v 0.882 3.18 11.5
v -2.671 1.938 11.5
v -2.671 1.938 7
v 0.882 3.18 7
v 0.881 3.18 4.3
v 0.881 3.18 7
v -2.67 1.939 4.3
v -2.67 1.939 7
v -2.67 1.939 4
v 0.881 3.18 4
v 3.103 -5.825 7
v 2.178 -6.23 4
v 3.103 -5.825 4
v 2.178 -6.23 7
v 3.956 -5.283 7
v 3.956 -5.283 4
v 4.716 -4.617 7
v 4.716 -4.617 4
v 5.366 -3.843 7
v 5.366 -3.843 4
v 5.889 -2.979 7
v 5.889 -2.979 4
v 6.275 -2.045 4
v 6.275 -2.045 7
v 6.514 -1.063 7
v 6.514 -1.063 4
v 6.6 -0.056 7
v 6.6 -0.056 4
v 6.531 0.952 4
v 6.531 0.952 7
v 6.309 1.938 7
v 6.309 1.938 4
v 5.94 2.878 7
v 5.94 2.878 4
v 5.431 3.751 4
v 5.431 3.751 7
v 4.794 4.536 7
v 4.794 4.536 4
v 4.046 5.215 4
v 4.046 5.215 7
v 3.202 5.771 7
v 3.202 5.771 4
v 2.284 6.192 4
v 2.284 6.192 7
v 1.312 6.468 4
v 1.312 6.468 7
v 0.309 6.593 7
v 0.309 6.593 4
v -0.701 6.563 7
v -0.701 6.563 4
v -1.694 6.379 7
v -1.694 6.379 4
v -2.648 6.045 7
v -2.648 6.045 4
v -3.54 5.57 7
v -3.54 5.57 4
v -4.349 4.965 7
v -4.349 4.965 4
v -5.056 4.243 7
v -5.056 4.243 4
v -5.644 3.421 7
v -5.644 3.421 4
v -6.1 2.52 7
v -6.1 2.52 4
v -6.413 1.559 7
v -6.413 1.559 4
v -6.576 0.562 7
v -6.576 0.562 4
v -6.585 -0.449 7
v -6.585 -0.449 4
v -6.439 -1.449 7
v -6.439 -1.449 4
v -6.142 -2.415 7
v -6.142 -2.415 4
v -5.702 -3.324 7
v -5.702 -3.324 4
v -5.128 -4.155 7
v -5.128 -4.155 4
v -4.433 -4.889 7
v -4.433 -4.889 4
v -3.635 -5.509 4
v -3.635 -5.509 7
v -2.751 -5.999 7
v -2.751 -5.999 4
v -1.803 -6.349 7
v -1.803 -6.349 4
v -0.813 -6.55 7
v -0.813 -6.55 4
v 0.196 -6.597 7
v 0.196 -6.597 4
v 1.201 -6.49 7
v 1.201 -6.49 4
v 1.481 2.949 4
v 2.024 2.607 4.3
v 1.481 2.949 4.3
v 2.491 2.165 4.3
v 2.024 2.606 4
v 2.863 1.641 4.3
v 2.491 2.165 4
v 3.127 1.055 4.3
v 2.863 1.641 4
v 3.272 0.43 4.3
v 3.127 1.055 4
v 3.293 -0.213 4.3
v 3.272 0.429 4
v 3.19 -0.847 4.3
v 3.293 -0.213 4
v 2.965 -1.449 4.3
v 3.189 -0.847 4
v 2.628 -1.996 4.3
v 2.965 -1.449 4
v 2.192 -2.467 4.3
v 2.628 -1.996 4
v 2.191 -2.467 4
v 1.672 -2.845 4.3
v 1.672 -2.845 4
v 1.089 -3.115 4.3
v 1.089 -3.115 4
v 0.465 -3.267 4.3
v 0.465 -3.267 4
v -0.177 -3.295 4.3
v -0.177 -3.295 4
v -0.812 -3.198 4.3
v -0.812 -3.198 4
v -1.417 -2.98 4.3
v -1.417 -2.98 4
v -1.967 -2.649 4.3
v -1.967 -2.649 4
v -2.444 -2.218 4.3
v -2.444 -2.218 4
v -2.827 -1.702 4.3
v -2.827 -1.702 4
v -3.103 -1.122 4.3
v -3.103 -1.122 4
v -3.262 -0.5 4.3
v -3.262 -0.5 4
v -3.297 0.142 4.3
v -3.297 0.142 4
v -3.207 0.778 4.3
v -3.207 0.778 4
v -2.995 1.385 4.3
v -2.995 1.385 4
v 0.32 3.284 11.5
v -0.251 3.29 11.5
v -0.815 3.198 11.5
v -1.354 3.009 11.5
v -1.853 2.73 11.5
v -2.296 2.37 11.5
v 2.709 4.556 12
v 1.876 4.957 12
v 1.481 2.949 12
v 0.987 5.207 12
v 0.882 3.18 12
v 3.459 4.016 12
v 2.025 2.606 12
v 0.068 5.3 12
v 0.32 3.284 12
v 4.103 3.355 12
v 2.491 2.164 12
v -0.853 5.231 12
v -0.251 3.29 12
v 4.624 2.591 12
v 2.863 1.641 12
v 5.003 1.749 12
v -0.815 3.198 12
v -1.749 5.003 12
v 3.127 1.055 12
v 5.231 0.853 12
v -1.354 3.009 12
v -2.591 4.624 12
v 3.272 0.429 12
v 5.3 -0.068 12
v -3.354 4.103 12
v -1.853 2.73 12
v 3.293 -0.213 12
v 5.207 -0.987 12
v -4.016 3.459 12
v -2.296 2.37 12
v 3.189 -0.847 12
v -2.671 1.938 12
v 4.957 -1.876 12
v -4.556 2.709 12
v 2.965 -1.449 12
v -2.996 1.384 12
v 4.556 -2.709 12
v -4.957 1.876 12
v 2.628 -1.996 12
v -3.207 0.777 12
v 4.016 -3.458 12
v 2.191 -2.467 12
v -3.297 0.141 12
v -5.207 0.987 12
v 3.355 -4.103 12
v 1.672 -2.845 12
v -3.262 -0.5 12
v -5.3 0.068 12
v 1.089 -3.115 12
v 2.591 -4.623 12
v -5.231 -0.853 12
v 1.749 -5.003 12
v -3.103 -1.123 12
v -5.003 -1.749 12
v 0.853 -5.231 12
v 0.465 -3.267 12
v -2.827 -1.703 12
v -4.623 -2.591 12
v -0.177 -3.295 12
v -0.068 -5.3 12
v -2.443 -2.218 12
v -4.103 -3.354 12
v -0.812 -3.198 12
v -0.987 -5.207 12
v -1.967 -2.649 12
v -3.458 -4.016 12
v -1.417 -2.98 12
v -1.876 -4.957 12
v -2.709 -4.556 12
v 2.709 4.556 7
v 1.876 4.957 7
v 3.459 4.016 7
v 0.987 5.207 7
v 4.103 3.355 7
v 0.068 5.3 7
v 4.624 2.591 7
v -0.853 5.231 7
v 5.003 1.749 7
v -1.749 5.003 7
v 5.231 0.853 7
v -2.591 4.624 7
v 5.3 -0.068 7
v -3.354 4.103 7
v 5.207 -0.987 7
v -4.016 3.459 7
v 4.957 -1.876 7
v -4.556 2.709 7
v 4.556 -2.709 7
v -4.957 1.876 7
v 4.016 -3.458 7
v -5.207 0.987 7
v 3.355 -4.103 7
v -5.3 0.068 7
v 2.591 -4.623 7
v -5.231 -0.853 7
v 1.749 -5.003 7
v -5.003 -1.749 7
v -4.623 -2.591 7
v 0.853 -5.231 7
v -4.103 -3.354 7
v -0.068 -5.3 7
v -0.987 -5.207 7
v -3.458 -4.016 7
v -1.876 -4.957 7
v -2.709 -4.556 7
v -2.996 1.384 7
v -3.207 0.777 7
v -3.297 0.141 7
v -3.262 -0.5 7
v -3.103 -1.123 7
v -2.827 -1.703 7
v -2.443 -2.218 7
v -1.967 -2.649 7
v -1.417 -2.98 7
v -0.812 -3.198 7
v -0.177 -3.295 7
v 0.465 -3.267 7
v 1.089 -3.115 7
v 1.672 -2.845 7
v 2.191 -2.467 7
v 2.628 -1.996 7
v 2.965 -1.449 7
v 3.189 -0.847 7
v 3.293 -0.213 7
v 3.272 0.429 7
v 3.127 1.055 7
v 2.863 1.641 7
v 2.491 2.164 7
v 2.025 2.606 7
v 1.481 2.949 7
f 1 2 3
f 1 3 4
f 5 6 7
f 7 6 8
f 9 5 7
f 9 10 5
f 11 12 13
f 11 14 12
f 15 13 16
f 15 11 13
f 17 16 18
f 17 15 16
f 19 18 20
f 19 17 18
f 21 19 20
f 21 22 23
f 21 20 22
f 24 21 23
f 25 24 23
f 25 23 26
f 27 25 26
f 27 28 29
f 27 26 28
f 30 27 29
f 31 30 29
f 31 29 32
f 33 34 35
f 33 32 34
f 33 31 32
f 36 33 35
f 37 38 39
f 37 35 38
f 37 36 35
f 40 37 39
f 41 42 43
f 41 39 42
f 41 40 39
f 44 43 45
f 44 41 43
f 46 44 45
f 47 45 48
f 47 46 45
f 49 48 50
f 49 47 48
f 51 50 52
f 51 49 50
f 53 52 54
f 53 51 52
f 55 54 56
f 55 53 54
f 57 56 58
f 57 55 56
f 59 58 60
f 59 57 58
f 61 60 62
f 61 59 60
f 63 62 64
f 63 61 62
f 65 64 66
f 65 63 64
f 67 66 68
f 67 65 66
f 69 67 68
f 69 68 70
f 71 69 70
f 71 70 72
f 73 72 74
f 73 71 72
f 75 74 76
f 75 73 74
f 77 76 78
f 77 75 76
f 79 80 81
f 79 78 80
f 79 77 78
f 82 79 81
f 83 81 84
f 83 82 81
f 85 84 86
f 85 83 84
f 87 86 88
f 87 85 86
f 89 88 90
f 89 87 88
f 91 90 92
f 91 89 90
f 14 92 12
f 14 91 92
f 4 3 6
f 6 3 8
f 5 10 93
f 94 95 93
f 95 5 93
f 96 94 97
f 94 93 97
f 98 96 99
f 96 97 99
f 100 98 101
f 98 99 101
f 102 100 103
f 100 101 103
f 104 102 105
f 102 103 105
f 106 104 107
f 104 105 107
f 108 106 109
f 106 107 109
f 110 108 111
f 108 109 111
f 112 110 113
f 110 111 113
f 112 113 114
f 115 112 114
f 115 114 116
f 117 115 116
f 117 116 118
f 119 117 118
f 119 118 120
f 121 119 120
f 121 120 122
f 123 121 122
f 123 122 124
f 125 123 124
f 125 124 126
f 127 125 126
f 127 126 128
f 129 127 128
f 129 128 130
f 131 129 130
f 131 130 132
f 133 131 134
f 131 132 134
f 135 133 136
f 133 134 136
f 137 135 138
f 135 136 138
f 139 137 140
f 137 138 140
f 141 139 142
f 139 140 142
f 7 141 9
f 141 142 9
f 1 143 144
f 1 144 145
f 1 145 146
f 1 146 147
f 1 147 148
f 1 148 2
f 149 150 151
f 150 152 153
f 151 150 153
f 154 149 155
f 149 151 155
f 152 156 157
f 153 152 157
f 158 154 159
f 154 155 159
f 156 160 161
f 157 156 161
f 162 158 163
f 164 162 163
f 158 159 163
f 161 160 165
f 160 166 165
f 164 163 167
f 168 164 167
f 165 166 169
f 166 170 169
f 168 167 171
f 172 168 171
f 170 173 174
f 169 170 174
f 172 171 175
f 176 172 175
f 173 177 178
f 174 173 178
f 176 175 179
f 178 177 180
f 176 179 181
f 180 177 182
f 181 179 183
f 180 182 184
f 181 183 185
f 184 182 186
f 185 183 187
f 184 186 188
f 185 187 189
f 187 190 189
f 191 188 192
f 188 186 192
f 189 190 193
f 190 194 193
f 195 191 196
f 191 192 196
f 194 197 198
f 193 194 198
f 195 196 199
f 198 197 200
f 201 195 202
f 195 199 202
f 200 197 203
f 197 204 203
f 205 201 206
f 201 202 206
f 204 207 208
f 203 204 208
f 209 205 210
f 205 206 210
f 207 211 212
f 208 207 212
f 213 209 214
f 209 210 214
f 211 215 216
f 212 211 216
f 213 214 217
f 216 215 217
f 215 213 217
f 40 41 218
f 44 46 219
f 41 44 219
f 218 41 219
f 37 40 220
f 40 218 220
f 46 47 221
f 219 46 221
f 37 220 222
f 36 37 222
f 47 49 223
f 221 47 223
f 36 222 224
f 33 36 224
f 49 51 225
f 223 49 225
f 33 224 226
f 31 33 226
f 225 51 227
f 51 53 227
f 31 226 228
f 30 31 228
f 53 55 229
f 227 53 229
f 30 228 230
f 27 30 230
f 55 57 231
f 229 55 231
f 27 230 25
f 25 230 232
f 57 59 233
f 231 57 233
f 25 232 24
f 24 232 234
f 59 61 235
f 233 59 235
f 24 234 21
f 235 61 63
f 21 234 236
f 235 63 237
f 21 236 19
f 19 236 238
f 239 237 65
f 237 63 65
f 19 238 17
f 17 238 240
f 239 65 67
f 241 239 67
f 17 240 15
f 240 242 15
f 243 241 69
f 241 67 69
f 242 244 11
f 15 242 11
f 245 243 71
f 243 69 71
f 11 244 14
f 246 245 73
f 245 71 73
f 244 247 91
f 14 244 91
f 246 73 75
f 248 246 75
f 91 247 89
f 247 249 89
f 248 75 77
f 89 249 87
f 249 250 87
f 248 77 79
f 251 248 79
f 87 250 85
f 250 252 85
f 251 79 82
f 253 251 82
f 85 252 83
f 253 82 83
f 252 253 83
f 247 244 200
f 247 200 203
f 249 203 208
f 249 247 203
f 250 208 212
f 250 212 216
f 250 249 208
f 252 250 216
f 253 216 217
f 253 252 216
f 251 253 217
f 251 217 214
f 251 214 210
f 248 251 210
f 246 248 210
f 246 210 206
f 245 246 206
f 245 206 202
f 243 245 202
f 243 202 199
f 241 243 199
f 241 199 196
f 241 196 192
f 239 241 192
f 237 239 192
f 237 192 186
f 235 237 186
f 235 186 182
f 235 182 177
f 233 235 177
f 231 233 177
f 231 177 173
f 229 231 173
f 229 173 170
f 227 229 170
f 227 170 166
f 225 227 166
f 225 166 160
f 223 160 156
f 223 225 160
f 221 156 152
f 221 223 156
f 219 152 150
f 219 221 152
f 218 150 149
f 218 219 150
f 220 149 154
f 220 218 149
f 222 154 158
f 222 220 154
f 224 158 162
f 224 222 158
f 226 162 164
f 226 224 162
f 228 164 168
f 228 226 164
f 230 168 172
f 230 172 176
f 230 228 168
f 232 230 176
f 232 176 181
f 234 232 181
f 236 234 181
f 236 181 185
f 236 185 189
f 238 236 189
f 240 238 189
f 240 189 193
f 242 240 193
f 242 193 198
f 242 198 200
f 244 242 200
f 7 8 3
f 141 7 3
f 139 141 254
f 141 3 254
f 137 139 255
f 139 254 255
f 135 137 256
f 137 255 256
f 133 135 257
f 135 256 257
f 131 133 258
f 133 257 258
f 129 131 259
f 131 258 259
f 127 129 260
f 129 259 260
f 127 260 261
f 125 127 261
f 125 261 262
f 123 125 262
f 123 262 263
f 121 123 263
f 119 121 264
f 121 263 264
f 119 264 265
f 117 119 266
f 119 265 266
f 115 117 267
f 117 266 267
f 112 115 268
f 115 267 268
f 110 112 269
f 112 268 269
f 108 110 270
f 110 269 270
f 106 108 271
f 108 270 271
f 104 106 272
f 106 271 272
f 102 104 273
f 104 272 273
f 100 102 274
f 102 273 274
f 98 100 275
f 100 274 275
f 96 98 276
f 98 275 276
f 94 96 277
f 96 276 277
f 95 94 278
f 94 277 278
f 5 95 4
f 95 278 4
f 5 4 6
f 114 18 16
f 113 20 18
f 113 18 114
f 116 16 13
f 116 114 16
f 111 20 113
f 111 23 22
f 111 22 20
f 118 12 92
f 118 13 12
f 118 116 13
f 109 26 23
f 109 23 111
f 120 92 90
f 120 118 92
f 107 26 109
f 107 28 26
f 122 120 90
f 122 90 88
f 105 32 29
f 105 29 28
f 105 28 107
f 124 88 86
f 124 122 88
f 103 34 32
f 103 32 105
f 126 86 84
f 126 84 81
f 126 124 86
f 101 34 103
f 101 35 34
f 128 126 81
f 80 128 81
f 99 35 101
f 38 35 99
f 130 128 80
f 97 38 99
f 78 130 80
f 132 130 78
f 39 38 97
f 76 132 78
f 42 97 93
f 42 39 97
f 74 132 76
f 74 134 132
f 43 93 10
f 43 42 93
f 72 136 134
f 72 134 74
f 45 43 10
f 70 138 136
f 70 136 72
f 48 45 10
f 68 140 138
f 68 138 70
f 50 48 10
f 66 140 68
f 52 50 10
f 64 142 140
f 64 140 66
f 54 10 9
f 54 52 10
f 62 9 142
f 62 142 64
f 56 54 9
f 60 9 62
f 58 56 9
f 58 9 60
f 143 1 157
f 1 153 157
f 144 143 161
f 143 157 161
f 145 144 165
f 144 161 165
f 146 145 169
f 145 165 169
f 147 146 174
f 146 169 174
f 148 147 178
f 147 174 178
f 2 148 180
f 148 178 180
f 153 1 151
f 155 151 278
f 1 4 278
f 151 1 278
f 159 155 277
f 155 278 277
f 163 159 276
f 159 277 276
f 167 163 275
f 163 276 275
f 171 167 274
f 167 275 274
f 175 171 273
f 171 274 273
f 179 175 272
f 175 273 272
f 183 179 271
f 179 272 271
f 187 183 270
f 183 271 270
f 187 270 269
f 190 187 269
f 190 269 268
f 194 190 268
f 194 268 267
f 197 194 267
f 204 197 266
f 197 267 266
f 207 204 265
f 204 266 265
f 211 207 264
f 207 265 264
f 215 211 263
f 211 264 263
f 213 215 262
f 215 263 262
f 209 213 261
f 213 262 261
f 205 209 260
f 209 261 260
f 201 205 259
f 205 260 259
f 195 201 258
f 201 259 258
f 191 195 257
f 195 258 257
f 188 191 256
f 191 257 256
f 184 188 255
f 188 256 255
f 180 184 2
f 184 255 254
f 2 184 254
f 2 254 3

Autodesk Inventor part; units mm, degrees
ref_plane "YZ Plane" through (0, 0, 0) normal (1, 0, 0) x (0, 1, 0)
ref_plane "XZ Plane" through (0, 0, 0) normal (0, 1, 0) x (-1, 0, 0)
ref_plane "XY Plane" through (0, 0, 0) normal (0, 0, 1) x (1, 0, 0)
ref_plane "Work Plane1" through (-3.2804, 8.4734, 7) normal (0, 0, -1) x (0.3299562, -0.9439962, 0)
sketch "Sketch5" plane through (-3.2804, 8.4734, 7) normal (0, 0, -1) x (0.3299562, -0.9439962, 0)
  circle A0 centre (9.0812, -0.3009) radius 5.6 projected
  circle A1 centre (9.0812, -0.3009) radius 6.6
  point P0 (9.0812, -0.3009)
  dimension "d13" = 1
extrude "Extrusion4" add sketch "Sketch5" along normal blind 3
sketch "Sketch6" plane through (0, 0, 7) normal (0, 0, 1) x (1, 0, 0)
  circle A0 centre (0, 0) radius 6.6 projected
  circle A1 centre (0, 0) radius 5.6 projected
  point P0 (0, 0)
extrude "Extrusion5" cut sketch "Sketch6" against normal blind 0.3
sketch "Sketch11" plane through (-3.2804, 8.4734, 7) normal (0, 0, -1) x (0.3299562, -0.9439962, 0)
  circle A0 centre (9.0812, -0.3009) radius 6.6
  circle A1 centre (9.0812, -0.3009) radius 3.3
  line L0 (6.3698, -2.1819) -> (6.3698, 1.5801)
  dimension "d26" = 13.2
  dimension "d27" = 6.6
  dimension "d28" = 3.762
extrude "Extrusion10" add sketch "Sketch11" along normal blind 2.7 contours A0 | L0 A1 picked at (6.2456, 0.0906)
sketch "Sketch13" plane through (-3.2804, 8.4734, 7) normal (0, 0, -1) x (0.3299562, -0.9439962, 0)
  circle A0 centre (9.0812, -0.3009) radius 5.3
  arc A1 (6.3703, -2.1826) -> (6.3703, 1.5809) centre (9.0812, -0.3009) ccw projected
  line L0 (6.3703, 1.5809) -> (6.3703, -2.1826) projected
  dimension "d33" = 10.6
extrude "Extrusion12" add sketch "Sketch13" against normal blind 5
sketch "Sketch14" plane through (0, 0, 4) normal (0, 0, -1) x (-1, 0, 0)
  line L0 (-0.881, 3.1802) -> (2.6703, 1.9389) projected
  arc A0 (-0.881, 3.1802) -> (2.6703, 1.9389) centre (0, 0) ccw projected
  circle A1 centre (0, 0) radius 5.6 projected
  point P0 (0, 0)
extrude "Extrusion13" add sketch "Sketch14" against normal up to surface (0.3 mm away)
sketch "Sketch15" plane through (0, 0, 12) normal (0, 0, 1) x (1, 0, 0)
  arc A0 (-2.6708, 1.9382) -> (0.8818, 3.18) centre (0, 0) ccw projected
  circle A1 centre (0, 0) radius 3.3
  point P0 (0, 0)
extrude "Extrusion14" cut sketch "Sketch15" against normal blind 0.5
properties part number "BlankLargeGearMotorInput"
